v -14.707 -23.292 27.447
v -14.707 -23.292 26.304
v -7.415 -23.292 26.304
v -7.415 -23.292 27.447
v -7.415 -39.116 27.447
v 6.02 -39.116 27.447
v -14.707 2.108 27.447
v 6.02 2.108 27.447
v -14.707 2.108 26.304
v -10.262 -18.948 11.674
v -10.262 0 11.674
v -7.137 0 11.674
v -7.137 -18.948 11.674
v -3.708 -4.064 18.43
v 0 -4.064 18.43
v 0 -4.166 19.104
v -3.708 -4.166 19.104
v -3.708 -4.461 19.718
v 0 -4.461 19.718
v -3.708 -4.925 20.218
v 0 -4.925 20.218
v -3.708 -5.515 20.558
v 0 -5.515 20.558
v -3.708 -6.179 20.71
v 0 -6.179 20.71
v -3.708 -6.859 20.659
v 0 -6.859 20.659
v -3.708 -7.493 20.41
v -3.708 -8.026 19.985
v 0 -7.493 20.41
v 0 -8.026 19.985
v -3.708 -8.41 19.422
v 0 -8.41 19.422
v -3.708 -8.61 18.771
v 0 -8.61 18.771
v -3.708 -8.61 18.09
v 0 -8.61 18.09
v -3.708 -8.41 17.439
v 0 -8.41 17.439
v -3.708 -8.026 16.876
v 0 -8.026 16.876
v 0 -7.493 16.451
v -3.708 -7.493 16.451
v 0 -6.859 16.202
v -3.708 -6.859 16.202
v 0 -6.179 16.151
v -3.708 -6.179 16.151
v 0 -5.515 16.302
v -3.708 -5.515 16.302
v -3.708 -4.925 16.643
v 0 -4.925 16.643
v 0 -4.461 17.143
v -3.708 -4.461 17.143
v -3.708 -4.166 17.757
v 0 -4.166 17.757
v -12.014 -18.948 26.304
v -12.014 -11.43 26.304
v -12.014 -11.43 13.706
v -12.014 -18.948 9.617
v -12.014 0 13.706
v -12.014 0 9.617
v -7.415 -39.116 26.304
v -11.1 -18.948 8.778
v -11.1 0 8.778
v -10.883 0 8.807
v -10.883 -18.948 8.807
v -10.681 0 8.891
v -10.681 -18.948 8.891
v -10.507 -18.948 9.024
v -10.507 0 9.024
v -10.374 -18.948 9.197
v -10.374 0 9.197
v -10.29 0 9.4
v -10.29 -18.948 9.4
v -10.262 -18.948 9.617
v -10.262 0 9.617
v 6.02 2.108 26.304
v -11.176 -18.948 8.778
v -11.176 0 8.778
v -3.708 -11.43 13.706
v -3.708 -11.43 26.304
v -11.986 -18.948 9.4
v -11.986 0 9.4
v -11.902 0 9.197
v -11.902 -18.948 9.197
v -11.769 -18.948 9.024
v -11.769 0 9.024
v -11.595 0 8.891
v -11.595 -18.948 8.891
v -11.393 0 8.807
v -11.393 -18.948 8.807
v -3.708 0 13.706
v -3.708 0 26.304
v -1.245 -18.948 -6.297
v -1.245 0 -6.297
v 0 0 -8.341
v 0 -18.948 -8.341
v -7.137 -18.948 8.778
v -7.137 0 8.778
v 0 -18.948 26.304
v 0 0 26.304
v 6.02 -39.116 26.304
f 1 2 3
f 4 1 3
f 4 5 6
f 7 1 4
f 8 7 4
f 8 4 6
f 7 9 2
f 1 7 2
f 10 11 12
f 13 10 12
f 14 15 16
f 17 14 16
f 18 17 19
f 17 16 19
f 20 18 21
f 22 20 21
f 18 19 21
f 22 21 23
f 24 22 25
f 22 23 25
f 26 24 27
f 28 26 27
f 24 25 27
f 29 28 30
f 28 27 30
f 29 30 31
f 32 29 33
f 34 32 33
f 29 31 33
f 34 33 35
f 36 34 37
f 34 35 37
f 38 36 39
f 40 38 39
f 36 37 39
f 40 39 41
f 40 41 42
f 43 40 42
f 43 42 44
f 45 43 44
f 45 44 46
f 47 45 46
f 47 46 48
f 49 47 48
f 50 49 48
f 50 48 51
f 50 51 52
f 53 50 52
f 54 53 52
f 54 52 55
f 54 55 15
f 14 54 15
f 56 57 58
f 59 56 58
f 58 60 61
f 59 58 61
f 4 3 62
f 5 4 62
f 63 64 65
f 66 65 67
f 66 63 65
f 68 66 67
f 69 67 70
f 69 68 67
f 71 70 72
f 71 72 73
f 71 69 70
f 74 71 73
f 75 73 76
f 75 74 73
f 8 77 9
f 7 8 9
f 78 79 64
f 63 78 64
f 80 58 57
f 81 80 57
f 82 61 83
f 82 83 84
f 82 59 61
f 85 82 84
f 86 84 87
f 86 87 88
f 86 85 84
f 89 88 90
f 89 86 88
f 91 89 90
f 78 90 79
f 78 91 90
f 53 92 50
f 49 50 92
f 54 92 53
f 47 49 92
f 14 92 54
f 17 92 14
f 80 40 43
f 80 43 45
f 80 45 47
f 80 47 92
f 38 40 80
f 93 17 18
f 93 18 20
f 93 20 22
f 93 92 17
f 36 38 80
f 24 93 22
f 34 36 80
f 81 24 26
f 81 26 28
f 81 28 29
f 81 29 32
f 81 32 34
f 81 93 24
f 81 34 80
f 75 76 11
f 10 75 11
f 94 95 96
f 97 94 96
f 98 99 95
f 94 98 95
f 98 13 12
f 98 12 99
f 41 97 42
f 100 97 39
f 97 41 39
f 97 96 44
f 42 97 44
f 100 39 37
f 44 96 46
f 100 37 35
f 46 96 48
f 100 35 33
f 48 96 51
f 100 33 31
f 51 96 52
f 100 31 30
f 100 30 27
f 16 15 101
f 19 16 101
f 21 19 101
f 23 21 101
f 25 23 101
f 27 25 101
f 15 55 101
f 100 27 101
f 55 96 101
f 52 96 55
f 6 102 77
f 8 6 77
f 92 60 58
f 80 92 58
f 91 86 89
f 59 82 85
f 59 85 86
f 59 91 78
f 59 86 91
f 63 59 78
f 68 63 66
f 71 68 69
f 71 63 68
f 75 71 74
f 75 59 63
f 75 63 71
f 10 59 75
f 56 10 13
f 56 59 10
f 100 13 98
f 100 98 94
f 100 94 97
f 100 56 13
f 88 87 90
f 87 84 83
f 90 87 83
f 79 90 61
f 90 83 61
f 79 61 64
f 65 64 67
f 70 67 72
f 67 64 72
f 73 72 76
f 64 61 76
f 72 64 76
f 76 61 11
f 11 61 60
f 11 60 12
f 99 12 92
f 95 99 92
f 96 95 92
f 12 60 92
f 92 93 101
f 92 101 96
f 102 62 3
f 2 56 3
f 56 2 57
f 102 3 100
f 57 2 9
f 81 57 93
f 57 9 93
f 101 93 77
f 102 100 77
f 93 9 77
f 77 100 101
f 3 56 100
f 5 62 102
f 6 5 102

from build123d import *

# Parameters (mm, degrees)
F1_DEPTH = 18.9484
F3_DEPTH = 1.143
F4_R     = 0.8382
F5_W     = 11.43
F5_H     = 12.5984
F6_DEPTH = 8.3058
F8_D     = 4.572


with BuildPart() as f1:
    # F0 (on Front) → F1 (new body)
    with BuildSketch(Plane.XZ):
        Polygon((0, 26.304375), (-12.0142, 26.304375), (-12.0142, 8.778375), (-10.2616, 8.778375), (-10.2616, 11.673975), (-7.1374, 11.673975), (-7.1374, 8.778375), (-1.245109, -6.297331), (0, -8.341225), align=None)
    extrude(amount=F1_DEPTH)

    # F2 (on face) → F3 (join)
    with BuildSketch(Plane.XY.offset(26.304375)):
        Polygon((6.0198, 2.1082), (-14.7066, 2.1082), (-14.7066, -23.2918), (-7.414963, -23.2918), (-7.414963, -39.116), (6.0198, -39.116), align=None)
    extrude(amount=F3_DEPTH)

    # F4
    f4_edges = [f1.edges().sort_by_distance(p)[0] for p in [
        (-12.0142, -9.4742, 8.778375),
        (-10.2616, -9.4742, 8.778375),
    ]]
    fillet(f4_edges, radius=F4_R)

    # F5 (on face) → F6 (cut)
    with BuildSketch(Plane(origin=(-12.0142, 0, 0), x_dir=(0, -1, 0), z_dir=(-1, 0, 0))):
        with Locations((5.715, 20.005175)):
            Rectangle(F5_W, F5_H)
    extrude(amount=-F6_DEPTH, mode=Mode.SUBTRACT)

    # F8 (through all)
    with Locations(Plane(origin=(-3.7084, 0, 0), x_dir=(0, -1, 0), z_dir=(-1, 0, 0))):
        with Locations((6.35, 18.430375)):
            Hole(F8_D / 2)


solid = f1.part
